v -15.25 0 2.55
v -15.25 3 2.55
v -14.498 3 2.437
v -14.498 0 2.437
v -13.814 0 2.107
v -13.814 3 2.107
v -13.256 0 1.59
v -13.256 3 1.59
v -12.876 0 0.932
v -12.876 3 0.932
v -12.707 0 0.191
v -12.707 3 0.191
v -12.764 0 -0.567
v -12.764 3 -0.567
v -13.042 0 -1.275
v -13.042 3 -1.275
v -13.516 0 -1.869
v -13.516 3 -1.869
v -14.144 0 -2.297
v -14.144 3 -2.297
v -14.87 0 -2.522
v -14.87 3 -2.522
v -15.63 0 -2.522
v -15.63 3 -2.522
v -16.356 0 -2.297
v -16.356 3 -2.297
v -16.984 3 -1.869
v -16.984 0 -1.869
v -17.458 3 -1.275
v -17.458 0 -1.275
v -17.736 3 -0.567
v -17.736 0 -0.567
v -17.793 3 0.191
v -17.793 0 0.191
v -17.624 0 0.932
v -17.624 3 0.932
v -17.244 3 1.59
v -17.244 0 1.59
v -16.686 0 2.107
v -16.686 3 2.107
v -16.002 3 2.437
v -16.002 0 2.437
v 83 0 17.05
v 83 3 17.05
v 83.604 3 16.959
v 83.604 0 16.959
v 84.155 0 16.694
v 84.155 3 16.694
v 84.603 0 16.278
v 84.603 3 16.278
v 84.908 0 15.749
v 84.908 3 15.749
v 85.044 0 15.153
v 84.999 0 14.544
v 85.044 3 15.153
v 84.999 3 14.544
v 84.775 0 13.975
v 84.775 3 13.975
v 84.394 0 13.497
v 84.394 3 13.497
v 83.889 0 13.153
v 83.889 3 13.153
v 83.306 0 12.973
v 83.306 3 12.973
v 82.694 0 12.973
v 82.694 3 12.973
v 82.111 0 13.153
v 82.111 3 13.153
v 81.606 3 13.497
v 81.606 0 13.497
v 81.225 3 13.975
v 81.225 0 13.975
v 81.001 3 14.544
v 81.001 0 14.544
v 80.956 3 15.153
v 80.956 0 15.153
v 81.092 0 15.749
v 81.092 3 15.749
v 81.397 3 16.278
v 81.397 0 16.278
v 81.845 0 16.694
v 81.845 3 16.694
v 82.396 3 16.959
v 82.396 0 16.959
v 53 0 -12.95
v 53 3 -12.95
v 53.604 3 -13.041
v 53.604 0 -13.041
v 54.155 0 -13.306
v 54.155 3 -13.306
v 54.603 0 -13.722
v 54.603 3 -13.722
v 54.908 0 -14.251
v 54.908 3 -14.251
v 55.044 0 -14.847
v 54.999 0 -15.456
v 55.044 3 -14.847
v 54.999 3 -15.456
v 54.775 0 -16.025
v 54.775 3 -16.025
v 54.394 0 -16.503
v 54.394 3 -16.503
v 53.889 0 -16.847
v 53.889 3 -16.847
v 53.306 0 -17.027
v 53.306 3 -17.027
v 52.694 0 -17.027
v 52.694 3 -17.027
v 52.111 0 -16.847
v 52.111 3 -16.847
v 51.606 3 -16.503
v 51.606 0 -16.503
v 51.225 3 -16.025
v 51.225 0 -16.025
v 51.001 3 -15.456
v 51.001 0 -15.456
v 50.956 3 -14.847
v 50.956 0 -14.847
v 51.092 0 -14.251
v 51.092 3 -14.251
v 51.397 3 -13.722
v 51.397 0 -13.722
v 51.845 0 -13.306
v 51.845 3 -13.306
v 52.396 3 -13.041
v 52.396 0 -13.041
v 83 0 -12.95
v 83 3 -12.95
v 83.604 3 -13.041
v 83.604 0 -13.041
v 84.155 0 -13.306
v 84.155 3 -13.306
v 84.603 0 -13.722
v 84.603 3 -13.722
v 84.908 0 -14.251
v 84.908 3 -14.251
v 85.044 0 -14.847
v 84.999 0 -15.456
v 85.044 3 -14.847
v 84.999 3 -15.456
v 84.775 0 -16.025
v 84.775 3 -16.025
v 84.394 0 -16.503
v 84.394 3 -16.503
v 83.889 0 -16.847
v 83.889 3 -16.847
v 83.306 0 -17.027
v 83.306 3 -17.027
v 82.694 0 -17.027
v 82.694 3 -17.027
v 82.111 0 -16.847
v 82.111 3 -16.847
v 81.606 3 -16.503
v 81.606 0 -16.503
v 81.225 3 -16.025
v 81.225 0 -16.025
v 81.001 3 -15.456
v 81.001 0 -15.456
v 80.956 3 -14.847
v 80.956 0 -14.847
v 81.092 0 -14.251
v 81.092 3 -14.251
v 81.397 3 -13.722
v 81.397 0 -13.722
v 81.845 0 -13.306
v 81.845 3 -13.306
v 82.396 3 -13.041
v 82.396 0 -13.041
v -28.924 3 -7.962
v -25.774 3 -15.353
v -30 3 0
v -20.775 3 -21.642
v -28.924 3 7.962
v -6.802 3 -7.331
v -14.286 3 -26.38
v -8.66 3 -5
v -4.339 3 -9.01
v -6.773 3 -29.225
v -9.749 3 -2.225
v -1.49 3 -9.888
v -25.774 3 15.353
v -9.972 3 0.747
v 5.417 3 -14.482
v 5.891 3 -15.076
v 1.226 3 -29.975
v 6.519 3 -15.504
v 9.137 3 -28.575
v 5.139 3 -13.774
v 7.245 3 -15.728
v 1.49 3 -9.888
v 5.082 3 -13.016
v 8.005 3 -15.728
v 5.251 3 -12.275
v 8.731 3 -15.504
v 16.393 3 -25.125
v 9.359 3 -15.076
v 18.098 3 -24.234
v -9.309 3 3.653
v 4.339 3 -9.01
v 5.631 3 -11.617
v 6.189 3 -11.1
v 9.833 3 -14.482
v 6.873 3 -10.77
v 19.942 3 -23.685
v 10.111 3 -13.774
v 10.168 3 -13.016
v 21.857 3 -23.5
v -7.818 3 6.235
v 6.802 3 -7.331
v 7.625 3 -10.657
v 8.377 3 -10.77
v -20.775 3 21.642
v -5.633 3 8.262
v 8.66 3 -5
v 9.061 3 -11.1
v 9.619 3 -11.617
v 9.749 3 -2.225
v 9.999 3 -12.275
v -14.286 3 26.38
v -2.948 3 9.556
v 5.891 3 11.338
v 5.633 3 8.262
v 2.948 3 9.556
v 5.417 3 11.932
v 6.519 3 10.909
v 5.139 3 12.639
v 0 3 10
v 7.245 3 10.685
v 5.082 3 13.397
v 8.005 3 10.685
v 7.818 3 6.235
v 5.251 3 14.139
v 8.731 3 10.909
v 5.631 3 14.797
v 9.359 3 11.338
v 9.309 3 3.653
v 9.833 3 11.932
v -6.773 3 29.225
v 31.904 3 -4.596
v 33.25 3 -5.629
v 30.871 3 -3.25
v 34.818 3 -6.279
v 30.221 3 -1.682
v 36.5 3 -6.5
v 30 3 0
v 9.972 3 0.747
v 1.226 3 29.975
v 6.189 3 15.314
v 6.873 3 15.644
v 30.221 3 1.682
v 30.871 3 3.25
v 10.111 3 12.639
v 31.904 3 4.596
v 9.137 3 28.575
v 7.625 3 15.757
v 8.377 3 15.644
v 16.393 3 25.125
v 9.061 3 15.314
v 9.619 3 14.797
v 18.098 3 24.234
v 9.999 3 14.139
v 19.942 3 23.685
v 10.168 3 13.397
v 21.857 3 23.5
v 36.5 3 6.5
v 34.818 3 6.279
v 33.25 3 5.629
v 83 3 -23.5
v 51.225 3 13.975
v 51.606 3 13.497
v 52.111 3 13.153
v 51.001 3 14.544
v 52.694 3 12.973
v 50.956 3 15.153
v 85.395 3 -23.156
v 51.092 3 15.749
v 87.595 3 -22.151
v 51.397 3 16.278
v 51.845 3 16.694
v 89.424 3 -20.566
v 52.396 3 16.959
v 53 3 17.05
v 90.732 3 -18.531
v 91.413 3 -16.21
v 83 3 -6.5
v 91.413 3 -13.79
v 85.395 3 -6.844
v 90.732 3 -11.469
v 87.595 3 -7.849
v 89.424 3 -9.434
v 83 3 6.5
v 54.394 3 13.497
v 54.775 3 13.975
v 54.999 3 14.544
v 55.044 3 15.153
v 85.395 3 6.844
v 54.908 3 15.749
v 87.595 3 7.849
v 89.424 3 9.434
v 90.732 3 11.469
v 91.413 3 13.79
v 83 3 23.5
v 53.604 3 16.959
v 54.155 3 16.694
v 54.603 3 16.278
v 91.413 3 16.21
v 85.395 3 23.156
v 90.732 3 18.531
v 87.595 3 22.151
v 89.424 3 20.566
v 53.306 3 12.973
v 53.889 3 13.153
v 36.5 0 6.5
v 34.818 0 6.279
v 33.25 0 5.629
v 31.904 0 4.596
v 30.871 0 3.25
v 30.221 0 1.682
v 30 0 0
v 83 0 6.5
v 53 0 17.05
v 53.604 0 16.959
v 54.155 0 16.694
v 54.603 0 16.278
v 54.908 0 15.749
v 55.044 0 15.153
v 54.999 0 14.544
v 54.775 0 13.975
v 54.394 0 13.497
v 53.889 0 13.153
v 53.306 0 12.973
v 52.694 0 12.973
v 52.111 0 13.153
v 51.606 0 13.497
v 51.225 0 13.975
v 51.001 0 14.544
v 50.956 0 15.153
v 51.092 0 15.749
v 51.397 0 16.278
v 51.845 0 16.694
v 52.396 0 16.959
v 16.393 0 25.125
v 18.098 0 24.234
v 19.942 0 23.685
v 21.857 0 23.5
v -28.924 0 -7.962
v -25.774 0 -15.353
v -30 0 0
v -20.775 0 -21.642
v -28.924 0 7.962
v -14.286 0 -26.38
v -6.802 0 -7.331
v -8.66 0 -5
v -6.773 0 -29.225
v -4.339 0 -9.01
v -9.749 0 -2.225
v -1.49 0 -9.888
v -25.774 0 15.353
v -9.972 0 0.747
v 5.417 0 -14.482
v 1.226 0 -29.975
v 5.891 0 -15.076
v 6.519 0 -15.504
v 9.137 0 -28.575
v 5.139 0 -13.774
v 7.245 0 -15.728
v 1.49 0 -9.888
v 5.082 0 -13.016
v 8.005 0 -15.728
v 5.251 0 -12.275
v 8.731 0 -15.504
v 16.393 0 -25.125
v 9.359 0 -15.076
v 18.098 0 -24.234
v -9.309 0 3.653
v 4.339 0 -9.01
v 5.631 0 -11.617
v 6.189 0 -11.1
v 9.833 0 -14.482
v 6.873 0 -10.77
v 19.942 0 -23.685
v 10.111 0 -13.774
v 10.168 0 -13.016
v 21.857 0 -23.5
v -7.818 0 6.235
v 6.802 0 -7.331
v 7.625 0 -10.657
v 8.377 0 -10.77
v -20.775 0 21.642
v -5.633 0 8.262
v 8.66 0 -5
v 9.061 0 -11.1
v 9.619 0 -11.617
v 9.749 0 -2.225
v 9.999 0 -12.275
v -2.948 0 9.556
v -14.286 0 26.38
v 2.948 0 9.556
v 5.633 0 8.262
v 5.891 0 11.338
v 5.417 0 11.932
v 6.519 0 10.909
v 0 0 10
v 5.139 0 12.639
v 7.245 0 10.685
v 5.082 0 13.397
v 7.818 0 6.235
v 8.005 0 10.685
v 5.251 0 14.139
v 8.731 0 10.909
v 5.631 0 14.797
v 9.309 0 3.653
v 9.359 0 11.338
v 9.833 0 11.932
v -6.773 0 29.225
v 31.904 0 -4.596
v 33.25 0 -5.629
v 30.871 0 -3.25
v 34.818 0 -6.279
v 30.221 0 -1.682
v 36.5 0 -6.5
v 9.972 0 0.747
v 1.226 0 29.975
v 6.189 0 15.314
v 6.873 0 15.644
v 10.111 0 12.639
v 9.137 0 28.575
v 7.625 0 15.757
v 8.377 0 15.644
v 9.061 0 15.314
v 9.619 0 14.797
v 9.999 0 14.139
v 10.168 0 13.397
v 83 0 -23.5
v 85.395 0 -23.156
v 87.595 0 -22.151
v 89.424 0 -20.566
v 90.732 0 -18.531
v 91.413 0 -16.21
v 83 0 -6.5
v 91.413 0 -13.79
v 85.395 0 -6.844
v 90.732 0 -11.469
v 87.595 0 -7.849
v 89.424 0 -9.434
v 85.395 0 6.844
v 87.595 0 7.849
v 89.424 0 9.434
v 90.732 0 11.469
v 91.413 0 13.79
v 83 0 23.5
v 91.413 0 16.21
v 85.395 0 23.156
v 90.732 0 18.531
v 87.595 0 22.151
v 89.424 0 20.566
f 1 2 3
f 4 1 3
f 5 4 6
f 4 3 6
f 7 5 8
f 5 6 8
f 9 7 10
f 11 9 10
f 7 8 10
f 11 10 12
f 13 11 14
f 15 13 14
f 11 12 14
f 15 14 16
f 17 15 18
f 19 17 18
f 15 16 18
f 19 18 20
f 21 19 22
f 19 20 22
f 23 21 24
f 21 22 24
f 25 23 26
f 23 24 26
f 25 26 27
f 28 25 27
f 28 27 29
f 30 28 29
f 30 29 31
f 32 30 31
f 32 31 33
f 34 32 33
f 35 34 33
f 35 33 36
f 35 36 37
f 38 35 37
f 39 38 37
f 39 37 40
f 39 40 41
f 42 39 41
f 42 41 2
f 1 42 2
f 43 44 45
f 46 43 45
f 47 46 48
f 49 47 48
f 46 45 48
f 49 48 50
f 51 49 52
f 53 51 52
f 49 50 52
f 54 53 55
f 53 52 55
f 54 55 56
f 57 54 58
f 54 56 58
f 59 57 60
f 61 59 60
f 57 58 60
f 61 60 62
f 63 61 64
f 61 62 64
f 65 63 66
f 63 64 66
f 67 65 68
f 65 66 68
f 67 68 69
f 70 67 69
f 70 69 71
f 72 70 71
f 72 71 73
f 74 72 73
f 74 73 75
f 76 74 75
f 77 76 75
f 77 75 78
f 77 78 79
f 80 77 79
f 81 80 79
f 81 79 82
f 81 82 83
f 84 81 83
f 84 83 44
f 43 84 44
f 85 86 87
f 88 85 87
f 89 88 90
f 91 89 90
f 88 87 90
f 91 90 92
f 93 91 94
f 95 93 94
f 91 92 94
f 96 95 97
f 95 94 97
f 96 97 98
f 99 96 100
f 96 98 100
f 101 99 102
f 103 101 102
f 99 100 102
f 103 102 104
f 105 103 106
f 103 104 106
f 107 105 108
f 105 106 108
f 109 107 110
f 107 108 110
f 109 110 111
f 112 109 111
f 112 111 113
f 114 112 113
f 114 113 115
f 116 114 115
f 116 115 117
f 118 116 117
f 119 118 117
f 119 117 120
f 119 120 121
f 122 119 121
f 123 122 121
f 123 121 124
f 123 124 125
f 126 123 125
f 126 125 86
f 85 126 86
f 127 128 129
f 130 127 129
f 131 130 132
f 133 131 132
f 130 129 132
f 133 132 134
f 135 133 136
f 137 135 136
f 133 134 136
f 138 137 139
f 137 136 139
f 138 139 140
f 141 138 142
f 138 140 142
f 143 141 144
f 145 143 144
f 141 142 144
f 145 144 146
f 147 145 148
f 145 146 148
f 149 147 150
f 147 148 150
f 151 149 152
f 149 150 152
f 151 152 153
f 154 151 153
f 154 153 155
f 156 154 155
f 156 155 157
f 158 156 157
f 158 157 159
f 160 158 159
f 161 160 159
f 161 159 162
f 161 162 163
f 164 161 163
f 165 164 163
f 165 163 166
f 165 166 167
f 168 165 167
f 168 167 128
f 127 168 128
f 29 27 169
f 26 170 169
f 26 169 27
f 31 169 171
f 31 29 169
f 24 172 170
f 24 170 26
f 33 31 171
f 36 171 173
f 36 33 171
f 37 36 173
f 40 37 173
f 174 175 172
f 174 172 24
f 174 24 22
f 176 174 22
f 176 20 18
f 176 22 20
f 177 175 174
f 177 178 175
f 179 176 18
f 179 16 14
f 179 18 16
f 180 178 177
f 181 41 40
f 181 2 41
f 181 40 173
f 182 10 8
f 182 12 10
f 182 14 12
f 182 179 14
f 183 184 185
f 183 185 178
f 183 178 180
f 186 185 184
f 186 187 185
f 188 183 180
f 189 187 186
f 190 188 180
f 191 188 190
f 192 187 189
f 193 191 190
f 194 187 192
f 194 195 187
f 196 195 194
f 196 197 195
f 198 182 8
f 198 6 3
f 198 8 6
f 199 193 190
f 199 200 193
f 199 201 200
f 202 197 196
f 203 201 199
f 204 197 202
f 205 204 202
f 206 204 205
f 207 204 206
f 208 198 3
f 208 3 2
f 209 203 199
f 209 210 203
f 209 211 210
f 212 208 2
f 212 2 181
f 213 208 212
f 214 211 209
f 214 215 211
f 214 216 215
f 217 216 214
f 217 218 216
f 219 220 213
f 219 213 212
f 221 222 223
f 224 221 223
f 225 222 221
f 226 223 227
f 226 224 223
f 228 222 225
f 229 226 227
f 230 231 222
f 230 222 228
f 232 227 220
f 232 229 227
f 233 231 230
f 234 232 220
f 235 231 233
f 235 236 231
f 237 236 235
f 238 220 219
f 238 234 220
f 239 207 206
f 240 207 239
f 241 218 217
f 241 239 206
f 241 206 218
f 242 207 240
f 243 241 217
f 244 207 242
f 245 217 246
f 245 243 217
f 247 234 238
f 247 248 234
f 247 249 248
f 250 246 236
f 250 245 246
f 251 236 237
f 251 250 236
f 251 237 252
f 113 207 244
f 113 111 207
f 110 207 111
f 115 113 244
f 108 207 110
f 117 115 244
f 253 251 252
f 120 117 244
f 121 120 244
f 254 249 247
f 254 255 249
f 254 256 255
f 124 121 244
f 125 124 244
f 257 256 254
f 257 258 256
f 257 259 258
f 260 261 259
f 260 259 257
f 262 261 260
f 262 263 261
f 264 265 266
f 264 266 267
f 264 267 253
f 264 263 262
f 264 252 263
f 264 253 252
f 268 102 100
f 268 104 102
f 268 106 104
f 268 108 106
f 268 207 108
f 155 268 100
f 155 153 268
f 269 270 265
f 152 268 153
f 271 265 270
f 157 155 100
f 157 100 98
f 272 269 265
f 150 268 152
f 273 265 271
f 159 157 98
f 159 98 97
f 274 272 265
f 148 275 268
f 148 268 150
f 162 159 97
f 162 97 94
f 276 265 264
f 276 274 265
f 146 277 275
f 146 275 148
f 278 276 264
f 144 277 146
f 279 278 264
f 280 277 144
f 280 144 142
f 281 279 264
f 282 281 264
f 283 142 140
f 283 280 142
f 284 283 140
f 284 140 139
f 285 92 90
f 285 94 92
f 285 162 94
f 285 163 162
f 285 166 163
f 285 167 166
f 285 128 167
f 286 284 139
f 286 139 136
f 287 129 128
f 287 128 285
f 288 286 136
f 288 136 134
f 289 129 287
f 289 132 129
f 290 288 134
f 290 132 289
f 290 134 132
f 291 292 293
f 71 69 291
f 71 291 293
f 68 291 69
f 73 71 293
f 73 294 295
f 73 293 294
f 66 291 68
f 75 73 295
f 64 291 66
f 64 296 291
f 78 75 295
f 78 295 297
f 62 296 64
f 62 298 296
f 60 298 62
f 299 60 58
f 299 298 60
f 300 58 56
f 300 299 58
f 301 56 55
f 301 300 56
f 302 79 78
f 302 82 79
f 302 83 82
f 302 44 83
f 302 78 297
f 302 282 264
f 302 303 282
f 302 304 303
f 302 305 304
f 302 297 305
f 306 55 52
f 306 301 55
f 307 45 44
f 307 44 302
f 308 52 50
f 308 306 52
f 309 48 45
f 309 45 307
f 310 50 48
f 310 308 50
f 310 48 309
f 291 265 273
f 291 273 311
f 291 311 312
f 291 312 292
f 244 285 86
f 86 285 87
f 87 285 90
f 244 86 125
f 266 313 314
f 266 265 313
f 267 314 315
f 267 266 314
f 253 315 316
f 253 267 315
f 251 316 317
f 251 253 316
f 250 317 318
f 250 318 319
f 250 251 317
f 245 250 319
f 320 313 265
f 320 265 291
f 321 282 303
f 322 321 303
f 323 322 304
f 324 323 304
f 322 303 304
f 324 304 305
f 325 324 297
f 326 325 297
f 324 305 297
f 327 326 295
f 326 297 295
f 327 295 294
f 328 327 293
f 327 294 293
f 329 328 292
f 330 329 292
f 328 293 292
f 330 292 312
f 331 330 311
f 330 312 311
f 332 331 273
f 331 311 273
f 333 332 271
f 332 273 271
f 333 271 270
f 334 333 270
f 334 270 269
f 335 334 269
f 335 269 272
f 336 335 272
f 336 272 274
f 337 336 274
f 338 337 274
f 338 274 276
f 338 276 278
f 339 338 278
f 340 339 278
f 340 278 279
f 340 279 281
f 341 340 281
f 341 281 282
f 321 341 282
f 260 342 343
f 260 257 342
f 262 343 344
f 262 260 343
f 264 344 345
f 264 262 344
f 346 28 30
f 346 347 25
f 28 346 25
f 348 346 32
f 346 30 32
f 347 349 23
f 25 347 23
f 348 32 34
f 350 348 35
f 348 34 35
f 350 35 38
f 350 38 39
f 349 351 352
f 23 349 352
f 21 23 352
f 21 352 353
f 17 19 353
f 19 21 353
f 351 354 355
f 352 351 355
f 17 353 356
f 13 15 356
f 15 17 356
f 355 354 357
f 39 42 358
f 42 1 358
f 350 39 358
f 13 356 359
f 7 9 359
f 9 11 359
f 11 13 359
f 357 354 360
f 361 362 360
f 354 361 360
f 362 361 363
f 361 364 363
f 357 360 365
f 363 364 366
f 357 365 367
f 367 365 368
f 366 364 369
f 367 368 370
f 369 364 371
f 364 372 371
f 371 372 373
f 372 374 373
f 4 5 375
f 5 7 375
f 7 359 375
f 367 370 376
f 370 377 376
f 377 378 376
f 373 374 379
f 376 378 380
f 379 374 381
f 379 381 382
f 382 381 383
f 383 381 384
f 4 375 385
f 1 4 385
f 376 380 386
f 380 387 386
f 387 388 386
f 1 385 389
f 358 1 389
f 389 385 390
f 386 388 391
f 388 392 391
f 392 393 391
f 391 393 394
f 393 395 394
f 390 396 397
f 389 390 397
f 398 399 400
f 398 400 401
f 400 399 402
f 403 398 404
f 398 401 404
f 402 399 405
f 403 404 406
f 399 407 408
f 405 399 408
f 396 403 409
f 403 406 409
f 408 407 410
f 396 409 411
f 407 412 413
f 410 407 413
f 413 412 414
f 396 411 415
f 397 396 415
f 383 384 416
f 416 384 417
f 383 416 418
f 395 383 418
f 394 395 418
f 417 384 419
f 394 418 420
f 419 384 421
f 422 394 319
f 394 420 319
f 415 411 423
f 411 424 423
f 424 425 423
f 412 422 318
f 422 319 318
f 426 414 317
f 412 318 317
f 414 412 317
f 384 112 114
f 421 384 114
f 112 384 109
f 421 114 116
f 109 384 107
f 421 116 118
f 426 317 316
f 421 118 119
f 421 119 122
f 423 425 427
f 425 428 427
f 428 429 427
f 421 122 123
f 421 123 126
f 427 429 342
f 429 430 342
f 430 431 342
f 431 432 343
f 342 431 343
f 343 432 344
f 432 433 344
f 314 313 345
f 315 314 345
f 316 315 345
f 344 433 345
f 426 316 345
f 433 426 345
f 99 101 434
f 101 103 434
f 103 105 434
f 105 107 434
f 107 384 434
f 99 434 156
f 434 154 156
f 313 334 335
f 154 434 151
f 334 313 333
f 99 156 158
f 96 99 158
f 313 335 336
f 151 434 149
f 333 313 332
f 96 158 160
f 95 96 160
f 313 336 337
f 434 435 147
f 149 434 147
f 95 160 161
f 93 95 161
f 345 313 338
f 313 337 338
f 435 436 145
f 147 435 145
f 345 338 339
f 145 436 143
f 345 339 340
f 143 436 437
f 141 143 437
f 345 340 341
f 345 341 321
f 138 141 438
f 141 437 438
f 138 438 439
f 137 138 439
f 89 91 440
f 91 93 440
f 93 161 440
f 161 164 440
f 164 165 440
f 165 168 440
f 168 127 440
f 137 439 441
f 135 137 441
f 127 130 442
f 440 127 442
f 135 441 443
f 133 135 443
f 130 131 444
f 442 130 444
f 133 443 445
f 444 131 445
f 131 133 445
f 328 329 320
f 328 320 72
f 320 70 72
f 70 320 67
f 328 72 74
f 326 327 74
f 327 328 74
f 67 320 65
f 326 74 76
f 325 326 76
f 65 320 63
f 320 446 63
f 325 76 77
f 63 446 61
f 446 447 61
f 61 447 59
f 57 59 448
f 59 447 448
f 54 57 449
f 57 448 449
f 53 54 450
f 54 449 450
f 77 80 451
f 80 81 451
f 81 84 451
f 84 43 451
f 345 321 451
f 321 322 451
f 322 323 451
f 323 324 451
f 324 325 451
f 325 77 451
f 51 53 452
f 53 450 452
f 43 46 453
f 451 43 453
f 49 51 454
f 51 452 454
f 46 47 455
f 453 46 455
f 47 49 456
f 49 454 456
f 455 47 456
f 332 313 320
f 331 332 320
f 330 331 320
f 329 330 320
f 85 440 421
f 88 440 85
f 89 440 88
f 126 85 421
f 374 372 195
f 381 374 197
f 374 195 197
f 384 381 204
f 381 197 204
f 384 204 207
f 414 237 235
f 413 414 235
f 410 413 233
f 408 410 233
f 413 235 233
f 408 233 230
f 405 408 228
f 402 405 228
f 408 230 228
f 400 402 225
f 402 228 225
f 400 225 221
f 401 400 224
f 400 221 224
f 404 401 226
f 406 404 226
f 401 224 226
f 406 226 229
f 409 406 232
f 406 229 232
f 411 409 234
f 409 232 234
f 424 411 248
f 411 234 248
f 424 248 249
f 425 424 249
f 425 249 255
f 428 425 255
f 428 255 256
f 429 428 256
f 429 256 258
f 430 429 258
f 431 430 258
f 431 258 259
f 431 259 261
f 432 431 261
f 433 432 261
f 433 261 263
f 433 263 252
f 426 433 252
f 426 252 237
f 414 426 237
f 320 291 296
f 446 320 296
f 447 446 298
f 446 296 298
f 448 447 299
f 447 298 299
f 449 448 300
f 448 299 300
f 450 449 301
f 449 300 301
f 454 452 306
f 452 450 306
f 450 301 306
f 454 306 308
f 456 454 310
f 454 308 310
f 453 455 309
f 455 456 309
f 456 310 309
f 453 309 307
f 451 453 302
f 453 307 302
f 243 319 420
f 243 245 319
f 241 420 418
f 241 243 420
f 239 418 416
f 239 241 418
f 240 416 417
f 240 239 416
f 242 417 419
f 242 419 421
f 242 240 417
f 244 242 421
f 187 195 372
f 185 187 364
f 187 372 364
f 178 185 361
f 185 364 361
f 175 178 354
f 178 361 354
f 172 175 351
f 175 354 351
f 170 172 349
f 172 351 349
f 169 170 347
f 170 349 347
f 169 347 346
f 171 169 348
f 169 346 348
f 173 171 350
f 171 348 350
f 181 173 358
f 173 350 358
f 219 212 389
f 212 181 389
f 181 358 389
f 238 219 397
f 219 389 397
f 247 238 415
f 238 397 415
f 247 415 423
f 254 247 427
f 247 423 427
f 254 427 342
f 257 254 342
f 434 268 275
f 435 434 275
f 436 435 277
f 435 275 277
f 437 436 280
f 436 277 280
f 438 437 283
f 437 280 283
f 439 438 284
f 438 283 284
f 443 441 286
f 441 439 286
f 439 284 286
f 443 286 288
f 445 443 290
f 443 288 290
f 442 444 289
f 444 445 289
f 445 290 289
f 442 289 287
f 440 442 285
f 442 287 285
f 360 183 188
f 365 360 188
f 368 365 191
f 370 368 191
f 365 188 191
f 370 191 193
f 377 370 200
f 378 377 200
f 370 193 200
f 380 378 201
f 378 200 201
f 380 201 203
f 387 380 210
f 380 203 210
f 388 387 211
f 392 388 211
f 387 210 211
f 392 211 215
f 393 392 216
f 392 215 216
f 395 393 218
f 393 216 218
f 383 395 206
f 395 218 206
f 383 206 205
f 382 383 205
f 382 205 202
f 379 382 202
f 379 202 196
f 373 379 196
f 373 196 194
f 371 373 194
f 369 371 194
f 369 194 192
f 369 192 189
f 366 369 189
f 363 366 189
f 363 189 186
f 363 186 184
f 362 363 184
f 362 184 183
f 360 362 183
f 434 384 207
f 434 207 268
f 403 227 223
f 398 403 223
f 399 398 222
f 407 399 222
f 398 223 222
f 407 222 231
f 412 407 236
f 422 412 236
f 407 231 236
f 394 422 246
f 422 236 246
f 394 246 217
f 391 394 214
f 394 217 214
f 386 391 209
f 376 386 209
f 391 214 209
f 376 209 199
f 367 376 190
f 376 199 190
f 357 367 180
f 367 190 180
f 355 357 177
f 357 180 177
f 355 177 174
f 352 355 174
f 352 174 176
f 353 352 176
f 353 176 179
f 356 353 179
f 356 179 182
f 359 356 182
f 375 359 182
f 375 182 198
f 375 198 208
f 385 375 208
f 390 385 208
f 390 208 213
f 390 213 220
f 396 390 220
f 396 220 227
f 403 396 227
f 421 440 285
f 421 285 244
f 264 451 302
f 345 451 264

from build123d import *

# Parameters (mm, degrees)
SKETCH1_R           = 30
BOSS_EXTRUDE1_DEPTH = 3
BOSS_EXTRUDE2_START = -3
BOSS_EXTRUDE2_DEPTH = 3
SKETCH3_R           = 2.05
CUT_EXTRUDE1_DEPTH  = 105.446158378
CUT_EXTRUDE3_DEPTH  = 105.446158378
FILLET1_R           = 10
FILLET2_R           = 6.5
SKETCH7_R           = 2.55
CUT_EXTRUDE4_DEPTH  = 97.33924434
CIRPATTERN1_COUNT   = 3
SKETCH8_R           = 10
CUT_EXTRUDE5_DEPTH  = 97.33924434


with BuildPart() as part:
    # Sketch1 → Boss-Extrude1 (new body)
    with BuildSketch(Plane(origin=(0, 0, 0), x_dir=(1, 0, 0), z_dir=(0, 1, 0))):
        with Locations(Location((0, 0, 0), (0, 0, 270))):
            Circle(SKETCH1_R)
    extrude(amount=BOSS_EXTRUDE1_DEPTH)

    # Sketch2 → Boss-Extrude2 (add)
    with BuildSketch(Plane(origin=(0, 3, 0), x_dir=(1, 0, 0), z_dir=(0, 1, 0)).offset(BOSS_EXTRUDE2_START)):
        with BuildLine():
            Line((100, 6.5), (29.287369291, 6.5))
            ThreePointArc((29.287369291, 6.5), (25.430321552, 15.915361943), (18.648056199, 23.5))
            Line((18.648056199, 23.5), (100, 23.5))
            Line((100, 23.5), (100, 6.5))
        make_face()
        with BuildLine():
            Line((29.287369291, -6.5), (100, -6.5))
            Line((100, -6.5), (100, -23.5))
            Line((100, -23.5), (18.648056199, -23.5))
            ThreePointArc((18.648056199, -23.5), (25.430321552, -15.915361943), (29.287369291, -6.5))
        make_face()
    extrude(amount=BOSS_EXTRUDE2_DEPTH)

    # Sketch3 → Cut-Extrude1 (cut, through all)
    with BuildSketch(Plane(origin=(0, 3, 0), x_dir=(1, 0, 0), z_dir=(0, 1, 0))):
        with Locations(Location((53, 15, 0), (0, 0, 270))):
            Circle(SKETCH3_R)
        with Locations(Location((83, 15, 0), (0, 0, 270))):
            Circle(SKETCH3_R)
        with Locations(Location((53, -15, 0), (0, 0, 270))):
            Circle(SKETCH3_R)
        with Locations(Location((83, -15, 0), (0, 0, 270))):
            Circle(SKETCH3_R)
    extrude(amount=-CUT_EXTRUDE1_DEPTH, mode=Mode.SUBTRACT)

    # Sketch6 → Cut-Extrude3 (cut, through all)
    with BuildSketch(Plane(origin=(0, 3, 0), x_dir=(1, 0, 0), z_dir=(0, 1, 0))):
        with BuildLine():
            Line((100, 23.5), (83, 23.5))
            ThreePointArc((83, 23.5), (91.5, 15), (83, 6.5))
            Line((83, 6.5), (100, 6.5))
            Line((100, 6.5), (100, 23.5))
        make_face()
        with BuildLine():
            Line((100, -6.5), (83, -6.5))
            ThreePointArc((83, -6.5), (91.5, -15), (83, -23.5))
            Line((83, -23.5), (100, -23.5))
            Line((100, -23.5), (100, -6.5))
        make_face()
    extrude(amount=-CUT_EXTRUDE3_DEPTH, mode=Mode.SUBTRACT)

    # Fillet1
    fillet1_edges = [part.edges().sort_by_distance(p)[0] for p in [
        (18.648056199, 1.5, 23.5),
        (18.648056199, 1.5, -23.5),
    ]]
    fillet(fillet1_edges, radius=FILLET1_R)

    # Fillet2
    fillet2_edges = [part.edges().sort_by_distance(p)[0] for p in [
        (29.287369291, 1.5, 6.5),
        (29.287369291, 1.5, -6.5),
    ]]
    fillet(fillet2_edges, radius=FILLET2_R - 0.0001)  # a hair under: the kernel refuses the full size

    # Sketch7 → Cut-Extrude4 (cut, through all)
    with BuildSketch(Plane(origin=(0, 3, 0), x_dir=(1, 0, 0), z_dir=(0, 1, 0))):
        with Locations(Location((-15.25, 0, 0), (0, 0, 270))):
            Circle(SKETCH7_R)
    cut_extrude4 = extrude(amount=-CUT_EXTRUDE4_DEPTH, mode=Mode.SUBTRACT)

    # CirPattern1: Cut-Extrude4 ×3 about axis
    cirpattern1_axis = Axis((0, 0, 0), (0, 1, 0))
    for i in range(1, CIRPATTERN1_COUNT):
        add(cut_extrude4.rotate(cirpattern1_axis, i * 360 / CIRPATTERN1_COUNT), mode=Mode.SUBTRACT)

    # Sketch8 → Cut-Extrude5 (cut, through all)
    with BuildSketch(Plane(origin=(0, 3, 0), x_dir=(1, 0, 0), z_dir=(0, 1, 0))):
        with Locations(Location((0, 0, 0), (0, 0, 270))):
            Circle(SKETCH8_R)
    extrude(amount=-CUT_EXTRUDE5_DEPTH, mode=Mode.SUBTRACT)


solid = part.part
